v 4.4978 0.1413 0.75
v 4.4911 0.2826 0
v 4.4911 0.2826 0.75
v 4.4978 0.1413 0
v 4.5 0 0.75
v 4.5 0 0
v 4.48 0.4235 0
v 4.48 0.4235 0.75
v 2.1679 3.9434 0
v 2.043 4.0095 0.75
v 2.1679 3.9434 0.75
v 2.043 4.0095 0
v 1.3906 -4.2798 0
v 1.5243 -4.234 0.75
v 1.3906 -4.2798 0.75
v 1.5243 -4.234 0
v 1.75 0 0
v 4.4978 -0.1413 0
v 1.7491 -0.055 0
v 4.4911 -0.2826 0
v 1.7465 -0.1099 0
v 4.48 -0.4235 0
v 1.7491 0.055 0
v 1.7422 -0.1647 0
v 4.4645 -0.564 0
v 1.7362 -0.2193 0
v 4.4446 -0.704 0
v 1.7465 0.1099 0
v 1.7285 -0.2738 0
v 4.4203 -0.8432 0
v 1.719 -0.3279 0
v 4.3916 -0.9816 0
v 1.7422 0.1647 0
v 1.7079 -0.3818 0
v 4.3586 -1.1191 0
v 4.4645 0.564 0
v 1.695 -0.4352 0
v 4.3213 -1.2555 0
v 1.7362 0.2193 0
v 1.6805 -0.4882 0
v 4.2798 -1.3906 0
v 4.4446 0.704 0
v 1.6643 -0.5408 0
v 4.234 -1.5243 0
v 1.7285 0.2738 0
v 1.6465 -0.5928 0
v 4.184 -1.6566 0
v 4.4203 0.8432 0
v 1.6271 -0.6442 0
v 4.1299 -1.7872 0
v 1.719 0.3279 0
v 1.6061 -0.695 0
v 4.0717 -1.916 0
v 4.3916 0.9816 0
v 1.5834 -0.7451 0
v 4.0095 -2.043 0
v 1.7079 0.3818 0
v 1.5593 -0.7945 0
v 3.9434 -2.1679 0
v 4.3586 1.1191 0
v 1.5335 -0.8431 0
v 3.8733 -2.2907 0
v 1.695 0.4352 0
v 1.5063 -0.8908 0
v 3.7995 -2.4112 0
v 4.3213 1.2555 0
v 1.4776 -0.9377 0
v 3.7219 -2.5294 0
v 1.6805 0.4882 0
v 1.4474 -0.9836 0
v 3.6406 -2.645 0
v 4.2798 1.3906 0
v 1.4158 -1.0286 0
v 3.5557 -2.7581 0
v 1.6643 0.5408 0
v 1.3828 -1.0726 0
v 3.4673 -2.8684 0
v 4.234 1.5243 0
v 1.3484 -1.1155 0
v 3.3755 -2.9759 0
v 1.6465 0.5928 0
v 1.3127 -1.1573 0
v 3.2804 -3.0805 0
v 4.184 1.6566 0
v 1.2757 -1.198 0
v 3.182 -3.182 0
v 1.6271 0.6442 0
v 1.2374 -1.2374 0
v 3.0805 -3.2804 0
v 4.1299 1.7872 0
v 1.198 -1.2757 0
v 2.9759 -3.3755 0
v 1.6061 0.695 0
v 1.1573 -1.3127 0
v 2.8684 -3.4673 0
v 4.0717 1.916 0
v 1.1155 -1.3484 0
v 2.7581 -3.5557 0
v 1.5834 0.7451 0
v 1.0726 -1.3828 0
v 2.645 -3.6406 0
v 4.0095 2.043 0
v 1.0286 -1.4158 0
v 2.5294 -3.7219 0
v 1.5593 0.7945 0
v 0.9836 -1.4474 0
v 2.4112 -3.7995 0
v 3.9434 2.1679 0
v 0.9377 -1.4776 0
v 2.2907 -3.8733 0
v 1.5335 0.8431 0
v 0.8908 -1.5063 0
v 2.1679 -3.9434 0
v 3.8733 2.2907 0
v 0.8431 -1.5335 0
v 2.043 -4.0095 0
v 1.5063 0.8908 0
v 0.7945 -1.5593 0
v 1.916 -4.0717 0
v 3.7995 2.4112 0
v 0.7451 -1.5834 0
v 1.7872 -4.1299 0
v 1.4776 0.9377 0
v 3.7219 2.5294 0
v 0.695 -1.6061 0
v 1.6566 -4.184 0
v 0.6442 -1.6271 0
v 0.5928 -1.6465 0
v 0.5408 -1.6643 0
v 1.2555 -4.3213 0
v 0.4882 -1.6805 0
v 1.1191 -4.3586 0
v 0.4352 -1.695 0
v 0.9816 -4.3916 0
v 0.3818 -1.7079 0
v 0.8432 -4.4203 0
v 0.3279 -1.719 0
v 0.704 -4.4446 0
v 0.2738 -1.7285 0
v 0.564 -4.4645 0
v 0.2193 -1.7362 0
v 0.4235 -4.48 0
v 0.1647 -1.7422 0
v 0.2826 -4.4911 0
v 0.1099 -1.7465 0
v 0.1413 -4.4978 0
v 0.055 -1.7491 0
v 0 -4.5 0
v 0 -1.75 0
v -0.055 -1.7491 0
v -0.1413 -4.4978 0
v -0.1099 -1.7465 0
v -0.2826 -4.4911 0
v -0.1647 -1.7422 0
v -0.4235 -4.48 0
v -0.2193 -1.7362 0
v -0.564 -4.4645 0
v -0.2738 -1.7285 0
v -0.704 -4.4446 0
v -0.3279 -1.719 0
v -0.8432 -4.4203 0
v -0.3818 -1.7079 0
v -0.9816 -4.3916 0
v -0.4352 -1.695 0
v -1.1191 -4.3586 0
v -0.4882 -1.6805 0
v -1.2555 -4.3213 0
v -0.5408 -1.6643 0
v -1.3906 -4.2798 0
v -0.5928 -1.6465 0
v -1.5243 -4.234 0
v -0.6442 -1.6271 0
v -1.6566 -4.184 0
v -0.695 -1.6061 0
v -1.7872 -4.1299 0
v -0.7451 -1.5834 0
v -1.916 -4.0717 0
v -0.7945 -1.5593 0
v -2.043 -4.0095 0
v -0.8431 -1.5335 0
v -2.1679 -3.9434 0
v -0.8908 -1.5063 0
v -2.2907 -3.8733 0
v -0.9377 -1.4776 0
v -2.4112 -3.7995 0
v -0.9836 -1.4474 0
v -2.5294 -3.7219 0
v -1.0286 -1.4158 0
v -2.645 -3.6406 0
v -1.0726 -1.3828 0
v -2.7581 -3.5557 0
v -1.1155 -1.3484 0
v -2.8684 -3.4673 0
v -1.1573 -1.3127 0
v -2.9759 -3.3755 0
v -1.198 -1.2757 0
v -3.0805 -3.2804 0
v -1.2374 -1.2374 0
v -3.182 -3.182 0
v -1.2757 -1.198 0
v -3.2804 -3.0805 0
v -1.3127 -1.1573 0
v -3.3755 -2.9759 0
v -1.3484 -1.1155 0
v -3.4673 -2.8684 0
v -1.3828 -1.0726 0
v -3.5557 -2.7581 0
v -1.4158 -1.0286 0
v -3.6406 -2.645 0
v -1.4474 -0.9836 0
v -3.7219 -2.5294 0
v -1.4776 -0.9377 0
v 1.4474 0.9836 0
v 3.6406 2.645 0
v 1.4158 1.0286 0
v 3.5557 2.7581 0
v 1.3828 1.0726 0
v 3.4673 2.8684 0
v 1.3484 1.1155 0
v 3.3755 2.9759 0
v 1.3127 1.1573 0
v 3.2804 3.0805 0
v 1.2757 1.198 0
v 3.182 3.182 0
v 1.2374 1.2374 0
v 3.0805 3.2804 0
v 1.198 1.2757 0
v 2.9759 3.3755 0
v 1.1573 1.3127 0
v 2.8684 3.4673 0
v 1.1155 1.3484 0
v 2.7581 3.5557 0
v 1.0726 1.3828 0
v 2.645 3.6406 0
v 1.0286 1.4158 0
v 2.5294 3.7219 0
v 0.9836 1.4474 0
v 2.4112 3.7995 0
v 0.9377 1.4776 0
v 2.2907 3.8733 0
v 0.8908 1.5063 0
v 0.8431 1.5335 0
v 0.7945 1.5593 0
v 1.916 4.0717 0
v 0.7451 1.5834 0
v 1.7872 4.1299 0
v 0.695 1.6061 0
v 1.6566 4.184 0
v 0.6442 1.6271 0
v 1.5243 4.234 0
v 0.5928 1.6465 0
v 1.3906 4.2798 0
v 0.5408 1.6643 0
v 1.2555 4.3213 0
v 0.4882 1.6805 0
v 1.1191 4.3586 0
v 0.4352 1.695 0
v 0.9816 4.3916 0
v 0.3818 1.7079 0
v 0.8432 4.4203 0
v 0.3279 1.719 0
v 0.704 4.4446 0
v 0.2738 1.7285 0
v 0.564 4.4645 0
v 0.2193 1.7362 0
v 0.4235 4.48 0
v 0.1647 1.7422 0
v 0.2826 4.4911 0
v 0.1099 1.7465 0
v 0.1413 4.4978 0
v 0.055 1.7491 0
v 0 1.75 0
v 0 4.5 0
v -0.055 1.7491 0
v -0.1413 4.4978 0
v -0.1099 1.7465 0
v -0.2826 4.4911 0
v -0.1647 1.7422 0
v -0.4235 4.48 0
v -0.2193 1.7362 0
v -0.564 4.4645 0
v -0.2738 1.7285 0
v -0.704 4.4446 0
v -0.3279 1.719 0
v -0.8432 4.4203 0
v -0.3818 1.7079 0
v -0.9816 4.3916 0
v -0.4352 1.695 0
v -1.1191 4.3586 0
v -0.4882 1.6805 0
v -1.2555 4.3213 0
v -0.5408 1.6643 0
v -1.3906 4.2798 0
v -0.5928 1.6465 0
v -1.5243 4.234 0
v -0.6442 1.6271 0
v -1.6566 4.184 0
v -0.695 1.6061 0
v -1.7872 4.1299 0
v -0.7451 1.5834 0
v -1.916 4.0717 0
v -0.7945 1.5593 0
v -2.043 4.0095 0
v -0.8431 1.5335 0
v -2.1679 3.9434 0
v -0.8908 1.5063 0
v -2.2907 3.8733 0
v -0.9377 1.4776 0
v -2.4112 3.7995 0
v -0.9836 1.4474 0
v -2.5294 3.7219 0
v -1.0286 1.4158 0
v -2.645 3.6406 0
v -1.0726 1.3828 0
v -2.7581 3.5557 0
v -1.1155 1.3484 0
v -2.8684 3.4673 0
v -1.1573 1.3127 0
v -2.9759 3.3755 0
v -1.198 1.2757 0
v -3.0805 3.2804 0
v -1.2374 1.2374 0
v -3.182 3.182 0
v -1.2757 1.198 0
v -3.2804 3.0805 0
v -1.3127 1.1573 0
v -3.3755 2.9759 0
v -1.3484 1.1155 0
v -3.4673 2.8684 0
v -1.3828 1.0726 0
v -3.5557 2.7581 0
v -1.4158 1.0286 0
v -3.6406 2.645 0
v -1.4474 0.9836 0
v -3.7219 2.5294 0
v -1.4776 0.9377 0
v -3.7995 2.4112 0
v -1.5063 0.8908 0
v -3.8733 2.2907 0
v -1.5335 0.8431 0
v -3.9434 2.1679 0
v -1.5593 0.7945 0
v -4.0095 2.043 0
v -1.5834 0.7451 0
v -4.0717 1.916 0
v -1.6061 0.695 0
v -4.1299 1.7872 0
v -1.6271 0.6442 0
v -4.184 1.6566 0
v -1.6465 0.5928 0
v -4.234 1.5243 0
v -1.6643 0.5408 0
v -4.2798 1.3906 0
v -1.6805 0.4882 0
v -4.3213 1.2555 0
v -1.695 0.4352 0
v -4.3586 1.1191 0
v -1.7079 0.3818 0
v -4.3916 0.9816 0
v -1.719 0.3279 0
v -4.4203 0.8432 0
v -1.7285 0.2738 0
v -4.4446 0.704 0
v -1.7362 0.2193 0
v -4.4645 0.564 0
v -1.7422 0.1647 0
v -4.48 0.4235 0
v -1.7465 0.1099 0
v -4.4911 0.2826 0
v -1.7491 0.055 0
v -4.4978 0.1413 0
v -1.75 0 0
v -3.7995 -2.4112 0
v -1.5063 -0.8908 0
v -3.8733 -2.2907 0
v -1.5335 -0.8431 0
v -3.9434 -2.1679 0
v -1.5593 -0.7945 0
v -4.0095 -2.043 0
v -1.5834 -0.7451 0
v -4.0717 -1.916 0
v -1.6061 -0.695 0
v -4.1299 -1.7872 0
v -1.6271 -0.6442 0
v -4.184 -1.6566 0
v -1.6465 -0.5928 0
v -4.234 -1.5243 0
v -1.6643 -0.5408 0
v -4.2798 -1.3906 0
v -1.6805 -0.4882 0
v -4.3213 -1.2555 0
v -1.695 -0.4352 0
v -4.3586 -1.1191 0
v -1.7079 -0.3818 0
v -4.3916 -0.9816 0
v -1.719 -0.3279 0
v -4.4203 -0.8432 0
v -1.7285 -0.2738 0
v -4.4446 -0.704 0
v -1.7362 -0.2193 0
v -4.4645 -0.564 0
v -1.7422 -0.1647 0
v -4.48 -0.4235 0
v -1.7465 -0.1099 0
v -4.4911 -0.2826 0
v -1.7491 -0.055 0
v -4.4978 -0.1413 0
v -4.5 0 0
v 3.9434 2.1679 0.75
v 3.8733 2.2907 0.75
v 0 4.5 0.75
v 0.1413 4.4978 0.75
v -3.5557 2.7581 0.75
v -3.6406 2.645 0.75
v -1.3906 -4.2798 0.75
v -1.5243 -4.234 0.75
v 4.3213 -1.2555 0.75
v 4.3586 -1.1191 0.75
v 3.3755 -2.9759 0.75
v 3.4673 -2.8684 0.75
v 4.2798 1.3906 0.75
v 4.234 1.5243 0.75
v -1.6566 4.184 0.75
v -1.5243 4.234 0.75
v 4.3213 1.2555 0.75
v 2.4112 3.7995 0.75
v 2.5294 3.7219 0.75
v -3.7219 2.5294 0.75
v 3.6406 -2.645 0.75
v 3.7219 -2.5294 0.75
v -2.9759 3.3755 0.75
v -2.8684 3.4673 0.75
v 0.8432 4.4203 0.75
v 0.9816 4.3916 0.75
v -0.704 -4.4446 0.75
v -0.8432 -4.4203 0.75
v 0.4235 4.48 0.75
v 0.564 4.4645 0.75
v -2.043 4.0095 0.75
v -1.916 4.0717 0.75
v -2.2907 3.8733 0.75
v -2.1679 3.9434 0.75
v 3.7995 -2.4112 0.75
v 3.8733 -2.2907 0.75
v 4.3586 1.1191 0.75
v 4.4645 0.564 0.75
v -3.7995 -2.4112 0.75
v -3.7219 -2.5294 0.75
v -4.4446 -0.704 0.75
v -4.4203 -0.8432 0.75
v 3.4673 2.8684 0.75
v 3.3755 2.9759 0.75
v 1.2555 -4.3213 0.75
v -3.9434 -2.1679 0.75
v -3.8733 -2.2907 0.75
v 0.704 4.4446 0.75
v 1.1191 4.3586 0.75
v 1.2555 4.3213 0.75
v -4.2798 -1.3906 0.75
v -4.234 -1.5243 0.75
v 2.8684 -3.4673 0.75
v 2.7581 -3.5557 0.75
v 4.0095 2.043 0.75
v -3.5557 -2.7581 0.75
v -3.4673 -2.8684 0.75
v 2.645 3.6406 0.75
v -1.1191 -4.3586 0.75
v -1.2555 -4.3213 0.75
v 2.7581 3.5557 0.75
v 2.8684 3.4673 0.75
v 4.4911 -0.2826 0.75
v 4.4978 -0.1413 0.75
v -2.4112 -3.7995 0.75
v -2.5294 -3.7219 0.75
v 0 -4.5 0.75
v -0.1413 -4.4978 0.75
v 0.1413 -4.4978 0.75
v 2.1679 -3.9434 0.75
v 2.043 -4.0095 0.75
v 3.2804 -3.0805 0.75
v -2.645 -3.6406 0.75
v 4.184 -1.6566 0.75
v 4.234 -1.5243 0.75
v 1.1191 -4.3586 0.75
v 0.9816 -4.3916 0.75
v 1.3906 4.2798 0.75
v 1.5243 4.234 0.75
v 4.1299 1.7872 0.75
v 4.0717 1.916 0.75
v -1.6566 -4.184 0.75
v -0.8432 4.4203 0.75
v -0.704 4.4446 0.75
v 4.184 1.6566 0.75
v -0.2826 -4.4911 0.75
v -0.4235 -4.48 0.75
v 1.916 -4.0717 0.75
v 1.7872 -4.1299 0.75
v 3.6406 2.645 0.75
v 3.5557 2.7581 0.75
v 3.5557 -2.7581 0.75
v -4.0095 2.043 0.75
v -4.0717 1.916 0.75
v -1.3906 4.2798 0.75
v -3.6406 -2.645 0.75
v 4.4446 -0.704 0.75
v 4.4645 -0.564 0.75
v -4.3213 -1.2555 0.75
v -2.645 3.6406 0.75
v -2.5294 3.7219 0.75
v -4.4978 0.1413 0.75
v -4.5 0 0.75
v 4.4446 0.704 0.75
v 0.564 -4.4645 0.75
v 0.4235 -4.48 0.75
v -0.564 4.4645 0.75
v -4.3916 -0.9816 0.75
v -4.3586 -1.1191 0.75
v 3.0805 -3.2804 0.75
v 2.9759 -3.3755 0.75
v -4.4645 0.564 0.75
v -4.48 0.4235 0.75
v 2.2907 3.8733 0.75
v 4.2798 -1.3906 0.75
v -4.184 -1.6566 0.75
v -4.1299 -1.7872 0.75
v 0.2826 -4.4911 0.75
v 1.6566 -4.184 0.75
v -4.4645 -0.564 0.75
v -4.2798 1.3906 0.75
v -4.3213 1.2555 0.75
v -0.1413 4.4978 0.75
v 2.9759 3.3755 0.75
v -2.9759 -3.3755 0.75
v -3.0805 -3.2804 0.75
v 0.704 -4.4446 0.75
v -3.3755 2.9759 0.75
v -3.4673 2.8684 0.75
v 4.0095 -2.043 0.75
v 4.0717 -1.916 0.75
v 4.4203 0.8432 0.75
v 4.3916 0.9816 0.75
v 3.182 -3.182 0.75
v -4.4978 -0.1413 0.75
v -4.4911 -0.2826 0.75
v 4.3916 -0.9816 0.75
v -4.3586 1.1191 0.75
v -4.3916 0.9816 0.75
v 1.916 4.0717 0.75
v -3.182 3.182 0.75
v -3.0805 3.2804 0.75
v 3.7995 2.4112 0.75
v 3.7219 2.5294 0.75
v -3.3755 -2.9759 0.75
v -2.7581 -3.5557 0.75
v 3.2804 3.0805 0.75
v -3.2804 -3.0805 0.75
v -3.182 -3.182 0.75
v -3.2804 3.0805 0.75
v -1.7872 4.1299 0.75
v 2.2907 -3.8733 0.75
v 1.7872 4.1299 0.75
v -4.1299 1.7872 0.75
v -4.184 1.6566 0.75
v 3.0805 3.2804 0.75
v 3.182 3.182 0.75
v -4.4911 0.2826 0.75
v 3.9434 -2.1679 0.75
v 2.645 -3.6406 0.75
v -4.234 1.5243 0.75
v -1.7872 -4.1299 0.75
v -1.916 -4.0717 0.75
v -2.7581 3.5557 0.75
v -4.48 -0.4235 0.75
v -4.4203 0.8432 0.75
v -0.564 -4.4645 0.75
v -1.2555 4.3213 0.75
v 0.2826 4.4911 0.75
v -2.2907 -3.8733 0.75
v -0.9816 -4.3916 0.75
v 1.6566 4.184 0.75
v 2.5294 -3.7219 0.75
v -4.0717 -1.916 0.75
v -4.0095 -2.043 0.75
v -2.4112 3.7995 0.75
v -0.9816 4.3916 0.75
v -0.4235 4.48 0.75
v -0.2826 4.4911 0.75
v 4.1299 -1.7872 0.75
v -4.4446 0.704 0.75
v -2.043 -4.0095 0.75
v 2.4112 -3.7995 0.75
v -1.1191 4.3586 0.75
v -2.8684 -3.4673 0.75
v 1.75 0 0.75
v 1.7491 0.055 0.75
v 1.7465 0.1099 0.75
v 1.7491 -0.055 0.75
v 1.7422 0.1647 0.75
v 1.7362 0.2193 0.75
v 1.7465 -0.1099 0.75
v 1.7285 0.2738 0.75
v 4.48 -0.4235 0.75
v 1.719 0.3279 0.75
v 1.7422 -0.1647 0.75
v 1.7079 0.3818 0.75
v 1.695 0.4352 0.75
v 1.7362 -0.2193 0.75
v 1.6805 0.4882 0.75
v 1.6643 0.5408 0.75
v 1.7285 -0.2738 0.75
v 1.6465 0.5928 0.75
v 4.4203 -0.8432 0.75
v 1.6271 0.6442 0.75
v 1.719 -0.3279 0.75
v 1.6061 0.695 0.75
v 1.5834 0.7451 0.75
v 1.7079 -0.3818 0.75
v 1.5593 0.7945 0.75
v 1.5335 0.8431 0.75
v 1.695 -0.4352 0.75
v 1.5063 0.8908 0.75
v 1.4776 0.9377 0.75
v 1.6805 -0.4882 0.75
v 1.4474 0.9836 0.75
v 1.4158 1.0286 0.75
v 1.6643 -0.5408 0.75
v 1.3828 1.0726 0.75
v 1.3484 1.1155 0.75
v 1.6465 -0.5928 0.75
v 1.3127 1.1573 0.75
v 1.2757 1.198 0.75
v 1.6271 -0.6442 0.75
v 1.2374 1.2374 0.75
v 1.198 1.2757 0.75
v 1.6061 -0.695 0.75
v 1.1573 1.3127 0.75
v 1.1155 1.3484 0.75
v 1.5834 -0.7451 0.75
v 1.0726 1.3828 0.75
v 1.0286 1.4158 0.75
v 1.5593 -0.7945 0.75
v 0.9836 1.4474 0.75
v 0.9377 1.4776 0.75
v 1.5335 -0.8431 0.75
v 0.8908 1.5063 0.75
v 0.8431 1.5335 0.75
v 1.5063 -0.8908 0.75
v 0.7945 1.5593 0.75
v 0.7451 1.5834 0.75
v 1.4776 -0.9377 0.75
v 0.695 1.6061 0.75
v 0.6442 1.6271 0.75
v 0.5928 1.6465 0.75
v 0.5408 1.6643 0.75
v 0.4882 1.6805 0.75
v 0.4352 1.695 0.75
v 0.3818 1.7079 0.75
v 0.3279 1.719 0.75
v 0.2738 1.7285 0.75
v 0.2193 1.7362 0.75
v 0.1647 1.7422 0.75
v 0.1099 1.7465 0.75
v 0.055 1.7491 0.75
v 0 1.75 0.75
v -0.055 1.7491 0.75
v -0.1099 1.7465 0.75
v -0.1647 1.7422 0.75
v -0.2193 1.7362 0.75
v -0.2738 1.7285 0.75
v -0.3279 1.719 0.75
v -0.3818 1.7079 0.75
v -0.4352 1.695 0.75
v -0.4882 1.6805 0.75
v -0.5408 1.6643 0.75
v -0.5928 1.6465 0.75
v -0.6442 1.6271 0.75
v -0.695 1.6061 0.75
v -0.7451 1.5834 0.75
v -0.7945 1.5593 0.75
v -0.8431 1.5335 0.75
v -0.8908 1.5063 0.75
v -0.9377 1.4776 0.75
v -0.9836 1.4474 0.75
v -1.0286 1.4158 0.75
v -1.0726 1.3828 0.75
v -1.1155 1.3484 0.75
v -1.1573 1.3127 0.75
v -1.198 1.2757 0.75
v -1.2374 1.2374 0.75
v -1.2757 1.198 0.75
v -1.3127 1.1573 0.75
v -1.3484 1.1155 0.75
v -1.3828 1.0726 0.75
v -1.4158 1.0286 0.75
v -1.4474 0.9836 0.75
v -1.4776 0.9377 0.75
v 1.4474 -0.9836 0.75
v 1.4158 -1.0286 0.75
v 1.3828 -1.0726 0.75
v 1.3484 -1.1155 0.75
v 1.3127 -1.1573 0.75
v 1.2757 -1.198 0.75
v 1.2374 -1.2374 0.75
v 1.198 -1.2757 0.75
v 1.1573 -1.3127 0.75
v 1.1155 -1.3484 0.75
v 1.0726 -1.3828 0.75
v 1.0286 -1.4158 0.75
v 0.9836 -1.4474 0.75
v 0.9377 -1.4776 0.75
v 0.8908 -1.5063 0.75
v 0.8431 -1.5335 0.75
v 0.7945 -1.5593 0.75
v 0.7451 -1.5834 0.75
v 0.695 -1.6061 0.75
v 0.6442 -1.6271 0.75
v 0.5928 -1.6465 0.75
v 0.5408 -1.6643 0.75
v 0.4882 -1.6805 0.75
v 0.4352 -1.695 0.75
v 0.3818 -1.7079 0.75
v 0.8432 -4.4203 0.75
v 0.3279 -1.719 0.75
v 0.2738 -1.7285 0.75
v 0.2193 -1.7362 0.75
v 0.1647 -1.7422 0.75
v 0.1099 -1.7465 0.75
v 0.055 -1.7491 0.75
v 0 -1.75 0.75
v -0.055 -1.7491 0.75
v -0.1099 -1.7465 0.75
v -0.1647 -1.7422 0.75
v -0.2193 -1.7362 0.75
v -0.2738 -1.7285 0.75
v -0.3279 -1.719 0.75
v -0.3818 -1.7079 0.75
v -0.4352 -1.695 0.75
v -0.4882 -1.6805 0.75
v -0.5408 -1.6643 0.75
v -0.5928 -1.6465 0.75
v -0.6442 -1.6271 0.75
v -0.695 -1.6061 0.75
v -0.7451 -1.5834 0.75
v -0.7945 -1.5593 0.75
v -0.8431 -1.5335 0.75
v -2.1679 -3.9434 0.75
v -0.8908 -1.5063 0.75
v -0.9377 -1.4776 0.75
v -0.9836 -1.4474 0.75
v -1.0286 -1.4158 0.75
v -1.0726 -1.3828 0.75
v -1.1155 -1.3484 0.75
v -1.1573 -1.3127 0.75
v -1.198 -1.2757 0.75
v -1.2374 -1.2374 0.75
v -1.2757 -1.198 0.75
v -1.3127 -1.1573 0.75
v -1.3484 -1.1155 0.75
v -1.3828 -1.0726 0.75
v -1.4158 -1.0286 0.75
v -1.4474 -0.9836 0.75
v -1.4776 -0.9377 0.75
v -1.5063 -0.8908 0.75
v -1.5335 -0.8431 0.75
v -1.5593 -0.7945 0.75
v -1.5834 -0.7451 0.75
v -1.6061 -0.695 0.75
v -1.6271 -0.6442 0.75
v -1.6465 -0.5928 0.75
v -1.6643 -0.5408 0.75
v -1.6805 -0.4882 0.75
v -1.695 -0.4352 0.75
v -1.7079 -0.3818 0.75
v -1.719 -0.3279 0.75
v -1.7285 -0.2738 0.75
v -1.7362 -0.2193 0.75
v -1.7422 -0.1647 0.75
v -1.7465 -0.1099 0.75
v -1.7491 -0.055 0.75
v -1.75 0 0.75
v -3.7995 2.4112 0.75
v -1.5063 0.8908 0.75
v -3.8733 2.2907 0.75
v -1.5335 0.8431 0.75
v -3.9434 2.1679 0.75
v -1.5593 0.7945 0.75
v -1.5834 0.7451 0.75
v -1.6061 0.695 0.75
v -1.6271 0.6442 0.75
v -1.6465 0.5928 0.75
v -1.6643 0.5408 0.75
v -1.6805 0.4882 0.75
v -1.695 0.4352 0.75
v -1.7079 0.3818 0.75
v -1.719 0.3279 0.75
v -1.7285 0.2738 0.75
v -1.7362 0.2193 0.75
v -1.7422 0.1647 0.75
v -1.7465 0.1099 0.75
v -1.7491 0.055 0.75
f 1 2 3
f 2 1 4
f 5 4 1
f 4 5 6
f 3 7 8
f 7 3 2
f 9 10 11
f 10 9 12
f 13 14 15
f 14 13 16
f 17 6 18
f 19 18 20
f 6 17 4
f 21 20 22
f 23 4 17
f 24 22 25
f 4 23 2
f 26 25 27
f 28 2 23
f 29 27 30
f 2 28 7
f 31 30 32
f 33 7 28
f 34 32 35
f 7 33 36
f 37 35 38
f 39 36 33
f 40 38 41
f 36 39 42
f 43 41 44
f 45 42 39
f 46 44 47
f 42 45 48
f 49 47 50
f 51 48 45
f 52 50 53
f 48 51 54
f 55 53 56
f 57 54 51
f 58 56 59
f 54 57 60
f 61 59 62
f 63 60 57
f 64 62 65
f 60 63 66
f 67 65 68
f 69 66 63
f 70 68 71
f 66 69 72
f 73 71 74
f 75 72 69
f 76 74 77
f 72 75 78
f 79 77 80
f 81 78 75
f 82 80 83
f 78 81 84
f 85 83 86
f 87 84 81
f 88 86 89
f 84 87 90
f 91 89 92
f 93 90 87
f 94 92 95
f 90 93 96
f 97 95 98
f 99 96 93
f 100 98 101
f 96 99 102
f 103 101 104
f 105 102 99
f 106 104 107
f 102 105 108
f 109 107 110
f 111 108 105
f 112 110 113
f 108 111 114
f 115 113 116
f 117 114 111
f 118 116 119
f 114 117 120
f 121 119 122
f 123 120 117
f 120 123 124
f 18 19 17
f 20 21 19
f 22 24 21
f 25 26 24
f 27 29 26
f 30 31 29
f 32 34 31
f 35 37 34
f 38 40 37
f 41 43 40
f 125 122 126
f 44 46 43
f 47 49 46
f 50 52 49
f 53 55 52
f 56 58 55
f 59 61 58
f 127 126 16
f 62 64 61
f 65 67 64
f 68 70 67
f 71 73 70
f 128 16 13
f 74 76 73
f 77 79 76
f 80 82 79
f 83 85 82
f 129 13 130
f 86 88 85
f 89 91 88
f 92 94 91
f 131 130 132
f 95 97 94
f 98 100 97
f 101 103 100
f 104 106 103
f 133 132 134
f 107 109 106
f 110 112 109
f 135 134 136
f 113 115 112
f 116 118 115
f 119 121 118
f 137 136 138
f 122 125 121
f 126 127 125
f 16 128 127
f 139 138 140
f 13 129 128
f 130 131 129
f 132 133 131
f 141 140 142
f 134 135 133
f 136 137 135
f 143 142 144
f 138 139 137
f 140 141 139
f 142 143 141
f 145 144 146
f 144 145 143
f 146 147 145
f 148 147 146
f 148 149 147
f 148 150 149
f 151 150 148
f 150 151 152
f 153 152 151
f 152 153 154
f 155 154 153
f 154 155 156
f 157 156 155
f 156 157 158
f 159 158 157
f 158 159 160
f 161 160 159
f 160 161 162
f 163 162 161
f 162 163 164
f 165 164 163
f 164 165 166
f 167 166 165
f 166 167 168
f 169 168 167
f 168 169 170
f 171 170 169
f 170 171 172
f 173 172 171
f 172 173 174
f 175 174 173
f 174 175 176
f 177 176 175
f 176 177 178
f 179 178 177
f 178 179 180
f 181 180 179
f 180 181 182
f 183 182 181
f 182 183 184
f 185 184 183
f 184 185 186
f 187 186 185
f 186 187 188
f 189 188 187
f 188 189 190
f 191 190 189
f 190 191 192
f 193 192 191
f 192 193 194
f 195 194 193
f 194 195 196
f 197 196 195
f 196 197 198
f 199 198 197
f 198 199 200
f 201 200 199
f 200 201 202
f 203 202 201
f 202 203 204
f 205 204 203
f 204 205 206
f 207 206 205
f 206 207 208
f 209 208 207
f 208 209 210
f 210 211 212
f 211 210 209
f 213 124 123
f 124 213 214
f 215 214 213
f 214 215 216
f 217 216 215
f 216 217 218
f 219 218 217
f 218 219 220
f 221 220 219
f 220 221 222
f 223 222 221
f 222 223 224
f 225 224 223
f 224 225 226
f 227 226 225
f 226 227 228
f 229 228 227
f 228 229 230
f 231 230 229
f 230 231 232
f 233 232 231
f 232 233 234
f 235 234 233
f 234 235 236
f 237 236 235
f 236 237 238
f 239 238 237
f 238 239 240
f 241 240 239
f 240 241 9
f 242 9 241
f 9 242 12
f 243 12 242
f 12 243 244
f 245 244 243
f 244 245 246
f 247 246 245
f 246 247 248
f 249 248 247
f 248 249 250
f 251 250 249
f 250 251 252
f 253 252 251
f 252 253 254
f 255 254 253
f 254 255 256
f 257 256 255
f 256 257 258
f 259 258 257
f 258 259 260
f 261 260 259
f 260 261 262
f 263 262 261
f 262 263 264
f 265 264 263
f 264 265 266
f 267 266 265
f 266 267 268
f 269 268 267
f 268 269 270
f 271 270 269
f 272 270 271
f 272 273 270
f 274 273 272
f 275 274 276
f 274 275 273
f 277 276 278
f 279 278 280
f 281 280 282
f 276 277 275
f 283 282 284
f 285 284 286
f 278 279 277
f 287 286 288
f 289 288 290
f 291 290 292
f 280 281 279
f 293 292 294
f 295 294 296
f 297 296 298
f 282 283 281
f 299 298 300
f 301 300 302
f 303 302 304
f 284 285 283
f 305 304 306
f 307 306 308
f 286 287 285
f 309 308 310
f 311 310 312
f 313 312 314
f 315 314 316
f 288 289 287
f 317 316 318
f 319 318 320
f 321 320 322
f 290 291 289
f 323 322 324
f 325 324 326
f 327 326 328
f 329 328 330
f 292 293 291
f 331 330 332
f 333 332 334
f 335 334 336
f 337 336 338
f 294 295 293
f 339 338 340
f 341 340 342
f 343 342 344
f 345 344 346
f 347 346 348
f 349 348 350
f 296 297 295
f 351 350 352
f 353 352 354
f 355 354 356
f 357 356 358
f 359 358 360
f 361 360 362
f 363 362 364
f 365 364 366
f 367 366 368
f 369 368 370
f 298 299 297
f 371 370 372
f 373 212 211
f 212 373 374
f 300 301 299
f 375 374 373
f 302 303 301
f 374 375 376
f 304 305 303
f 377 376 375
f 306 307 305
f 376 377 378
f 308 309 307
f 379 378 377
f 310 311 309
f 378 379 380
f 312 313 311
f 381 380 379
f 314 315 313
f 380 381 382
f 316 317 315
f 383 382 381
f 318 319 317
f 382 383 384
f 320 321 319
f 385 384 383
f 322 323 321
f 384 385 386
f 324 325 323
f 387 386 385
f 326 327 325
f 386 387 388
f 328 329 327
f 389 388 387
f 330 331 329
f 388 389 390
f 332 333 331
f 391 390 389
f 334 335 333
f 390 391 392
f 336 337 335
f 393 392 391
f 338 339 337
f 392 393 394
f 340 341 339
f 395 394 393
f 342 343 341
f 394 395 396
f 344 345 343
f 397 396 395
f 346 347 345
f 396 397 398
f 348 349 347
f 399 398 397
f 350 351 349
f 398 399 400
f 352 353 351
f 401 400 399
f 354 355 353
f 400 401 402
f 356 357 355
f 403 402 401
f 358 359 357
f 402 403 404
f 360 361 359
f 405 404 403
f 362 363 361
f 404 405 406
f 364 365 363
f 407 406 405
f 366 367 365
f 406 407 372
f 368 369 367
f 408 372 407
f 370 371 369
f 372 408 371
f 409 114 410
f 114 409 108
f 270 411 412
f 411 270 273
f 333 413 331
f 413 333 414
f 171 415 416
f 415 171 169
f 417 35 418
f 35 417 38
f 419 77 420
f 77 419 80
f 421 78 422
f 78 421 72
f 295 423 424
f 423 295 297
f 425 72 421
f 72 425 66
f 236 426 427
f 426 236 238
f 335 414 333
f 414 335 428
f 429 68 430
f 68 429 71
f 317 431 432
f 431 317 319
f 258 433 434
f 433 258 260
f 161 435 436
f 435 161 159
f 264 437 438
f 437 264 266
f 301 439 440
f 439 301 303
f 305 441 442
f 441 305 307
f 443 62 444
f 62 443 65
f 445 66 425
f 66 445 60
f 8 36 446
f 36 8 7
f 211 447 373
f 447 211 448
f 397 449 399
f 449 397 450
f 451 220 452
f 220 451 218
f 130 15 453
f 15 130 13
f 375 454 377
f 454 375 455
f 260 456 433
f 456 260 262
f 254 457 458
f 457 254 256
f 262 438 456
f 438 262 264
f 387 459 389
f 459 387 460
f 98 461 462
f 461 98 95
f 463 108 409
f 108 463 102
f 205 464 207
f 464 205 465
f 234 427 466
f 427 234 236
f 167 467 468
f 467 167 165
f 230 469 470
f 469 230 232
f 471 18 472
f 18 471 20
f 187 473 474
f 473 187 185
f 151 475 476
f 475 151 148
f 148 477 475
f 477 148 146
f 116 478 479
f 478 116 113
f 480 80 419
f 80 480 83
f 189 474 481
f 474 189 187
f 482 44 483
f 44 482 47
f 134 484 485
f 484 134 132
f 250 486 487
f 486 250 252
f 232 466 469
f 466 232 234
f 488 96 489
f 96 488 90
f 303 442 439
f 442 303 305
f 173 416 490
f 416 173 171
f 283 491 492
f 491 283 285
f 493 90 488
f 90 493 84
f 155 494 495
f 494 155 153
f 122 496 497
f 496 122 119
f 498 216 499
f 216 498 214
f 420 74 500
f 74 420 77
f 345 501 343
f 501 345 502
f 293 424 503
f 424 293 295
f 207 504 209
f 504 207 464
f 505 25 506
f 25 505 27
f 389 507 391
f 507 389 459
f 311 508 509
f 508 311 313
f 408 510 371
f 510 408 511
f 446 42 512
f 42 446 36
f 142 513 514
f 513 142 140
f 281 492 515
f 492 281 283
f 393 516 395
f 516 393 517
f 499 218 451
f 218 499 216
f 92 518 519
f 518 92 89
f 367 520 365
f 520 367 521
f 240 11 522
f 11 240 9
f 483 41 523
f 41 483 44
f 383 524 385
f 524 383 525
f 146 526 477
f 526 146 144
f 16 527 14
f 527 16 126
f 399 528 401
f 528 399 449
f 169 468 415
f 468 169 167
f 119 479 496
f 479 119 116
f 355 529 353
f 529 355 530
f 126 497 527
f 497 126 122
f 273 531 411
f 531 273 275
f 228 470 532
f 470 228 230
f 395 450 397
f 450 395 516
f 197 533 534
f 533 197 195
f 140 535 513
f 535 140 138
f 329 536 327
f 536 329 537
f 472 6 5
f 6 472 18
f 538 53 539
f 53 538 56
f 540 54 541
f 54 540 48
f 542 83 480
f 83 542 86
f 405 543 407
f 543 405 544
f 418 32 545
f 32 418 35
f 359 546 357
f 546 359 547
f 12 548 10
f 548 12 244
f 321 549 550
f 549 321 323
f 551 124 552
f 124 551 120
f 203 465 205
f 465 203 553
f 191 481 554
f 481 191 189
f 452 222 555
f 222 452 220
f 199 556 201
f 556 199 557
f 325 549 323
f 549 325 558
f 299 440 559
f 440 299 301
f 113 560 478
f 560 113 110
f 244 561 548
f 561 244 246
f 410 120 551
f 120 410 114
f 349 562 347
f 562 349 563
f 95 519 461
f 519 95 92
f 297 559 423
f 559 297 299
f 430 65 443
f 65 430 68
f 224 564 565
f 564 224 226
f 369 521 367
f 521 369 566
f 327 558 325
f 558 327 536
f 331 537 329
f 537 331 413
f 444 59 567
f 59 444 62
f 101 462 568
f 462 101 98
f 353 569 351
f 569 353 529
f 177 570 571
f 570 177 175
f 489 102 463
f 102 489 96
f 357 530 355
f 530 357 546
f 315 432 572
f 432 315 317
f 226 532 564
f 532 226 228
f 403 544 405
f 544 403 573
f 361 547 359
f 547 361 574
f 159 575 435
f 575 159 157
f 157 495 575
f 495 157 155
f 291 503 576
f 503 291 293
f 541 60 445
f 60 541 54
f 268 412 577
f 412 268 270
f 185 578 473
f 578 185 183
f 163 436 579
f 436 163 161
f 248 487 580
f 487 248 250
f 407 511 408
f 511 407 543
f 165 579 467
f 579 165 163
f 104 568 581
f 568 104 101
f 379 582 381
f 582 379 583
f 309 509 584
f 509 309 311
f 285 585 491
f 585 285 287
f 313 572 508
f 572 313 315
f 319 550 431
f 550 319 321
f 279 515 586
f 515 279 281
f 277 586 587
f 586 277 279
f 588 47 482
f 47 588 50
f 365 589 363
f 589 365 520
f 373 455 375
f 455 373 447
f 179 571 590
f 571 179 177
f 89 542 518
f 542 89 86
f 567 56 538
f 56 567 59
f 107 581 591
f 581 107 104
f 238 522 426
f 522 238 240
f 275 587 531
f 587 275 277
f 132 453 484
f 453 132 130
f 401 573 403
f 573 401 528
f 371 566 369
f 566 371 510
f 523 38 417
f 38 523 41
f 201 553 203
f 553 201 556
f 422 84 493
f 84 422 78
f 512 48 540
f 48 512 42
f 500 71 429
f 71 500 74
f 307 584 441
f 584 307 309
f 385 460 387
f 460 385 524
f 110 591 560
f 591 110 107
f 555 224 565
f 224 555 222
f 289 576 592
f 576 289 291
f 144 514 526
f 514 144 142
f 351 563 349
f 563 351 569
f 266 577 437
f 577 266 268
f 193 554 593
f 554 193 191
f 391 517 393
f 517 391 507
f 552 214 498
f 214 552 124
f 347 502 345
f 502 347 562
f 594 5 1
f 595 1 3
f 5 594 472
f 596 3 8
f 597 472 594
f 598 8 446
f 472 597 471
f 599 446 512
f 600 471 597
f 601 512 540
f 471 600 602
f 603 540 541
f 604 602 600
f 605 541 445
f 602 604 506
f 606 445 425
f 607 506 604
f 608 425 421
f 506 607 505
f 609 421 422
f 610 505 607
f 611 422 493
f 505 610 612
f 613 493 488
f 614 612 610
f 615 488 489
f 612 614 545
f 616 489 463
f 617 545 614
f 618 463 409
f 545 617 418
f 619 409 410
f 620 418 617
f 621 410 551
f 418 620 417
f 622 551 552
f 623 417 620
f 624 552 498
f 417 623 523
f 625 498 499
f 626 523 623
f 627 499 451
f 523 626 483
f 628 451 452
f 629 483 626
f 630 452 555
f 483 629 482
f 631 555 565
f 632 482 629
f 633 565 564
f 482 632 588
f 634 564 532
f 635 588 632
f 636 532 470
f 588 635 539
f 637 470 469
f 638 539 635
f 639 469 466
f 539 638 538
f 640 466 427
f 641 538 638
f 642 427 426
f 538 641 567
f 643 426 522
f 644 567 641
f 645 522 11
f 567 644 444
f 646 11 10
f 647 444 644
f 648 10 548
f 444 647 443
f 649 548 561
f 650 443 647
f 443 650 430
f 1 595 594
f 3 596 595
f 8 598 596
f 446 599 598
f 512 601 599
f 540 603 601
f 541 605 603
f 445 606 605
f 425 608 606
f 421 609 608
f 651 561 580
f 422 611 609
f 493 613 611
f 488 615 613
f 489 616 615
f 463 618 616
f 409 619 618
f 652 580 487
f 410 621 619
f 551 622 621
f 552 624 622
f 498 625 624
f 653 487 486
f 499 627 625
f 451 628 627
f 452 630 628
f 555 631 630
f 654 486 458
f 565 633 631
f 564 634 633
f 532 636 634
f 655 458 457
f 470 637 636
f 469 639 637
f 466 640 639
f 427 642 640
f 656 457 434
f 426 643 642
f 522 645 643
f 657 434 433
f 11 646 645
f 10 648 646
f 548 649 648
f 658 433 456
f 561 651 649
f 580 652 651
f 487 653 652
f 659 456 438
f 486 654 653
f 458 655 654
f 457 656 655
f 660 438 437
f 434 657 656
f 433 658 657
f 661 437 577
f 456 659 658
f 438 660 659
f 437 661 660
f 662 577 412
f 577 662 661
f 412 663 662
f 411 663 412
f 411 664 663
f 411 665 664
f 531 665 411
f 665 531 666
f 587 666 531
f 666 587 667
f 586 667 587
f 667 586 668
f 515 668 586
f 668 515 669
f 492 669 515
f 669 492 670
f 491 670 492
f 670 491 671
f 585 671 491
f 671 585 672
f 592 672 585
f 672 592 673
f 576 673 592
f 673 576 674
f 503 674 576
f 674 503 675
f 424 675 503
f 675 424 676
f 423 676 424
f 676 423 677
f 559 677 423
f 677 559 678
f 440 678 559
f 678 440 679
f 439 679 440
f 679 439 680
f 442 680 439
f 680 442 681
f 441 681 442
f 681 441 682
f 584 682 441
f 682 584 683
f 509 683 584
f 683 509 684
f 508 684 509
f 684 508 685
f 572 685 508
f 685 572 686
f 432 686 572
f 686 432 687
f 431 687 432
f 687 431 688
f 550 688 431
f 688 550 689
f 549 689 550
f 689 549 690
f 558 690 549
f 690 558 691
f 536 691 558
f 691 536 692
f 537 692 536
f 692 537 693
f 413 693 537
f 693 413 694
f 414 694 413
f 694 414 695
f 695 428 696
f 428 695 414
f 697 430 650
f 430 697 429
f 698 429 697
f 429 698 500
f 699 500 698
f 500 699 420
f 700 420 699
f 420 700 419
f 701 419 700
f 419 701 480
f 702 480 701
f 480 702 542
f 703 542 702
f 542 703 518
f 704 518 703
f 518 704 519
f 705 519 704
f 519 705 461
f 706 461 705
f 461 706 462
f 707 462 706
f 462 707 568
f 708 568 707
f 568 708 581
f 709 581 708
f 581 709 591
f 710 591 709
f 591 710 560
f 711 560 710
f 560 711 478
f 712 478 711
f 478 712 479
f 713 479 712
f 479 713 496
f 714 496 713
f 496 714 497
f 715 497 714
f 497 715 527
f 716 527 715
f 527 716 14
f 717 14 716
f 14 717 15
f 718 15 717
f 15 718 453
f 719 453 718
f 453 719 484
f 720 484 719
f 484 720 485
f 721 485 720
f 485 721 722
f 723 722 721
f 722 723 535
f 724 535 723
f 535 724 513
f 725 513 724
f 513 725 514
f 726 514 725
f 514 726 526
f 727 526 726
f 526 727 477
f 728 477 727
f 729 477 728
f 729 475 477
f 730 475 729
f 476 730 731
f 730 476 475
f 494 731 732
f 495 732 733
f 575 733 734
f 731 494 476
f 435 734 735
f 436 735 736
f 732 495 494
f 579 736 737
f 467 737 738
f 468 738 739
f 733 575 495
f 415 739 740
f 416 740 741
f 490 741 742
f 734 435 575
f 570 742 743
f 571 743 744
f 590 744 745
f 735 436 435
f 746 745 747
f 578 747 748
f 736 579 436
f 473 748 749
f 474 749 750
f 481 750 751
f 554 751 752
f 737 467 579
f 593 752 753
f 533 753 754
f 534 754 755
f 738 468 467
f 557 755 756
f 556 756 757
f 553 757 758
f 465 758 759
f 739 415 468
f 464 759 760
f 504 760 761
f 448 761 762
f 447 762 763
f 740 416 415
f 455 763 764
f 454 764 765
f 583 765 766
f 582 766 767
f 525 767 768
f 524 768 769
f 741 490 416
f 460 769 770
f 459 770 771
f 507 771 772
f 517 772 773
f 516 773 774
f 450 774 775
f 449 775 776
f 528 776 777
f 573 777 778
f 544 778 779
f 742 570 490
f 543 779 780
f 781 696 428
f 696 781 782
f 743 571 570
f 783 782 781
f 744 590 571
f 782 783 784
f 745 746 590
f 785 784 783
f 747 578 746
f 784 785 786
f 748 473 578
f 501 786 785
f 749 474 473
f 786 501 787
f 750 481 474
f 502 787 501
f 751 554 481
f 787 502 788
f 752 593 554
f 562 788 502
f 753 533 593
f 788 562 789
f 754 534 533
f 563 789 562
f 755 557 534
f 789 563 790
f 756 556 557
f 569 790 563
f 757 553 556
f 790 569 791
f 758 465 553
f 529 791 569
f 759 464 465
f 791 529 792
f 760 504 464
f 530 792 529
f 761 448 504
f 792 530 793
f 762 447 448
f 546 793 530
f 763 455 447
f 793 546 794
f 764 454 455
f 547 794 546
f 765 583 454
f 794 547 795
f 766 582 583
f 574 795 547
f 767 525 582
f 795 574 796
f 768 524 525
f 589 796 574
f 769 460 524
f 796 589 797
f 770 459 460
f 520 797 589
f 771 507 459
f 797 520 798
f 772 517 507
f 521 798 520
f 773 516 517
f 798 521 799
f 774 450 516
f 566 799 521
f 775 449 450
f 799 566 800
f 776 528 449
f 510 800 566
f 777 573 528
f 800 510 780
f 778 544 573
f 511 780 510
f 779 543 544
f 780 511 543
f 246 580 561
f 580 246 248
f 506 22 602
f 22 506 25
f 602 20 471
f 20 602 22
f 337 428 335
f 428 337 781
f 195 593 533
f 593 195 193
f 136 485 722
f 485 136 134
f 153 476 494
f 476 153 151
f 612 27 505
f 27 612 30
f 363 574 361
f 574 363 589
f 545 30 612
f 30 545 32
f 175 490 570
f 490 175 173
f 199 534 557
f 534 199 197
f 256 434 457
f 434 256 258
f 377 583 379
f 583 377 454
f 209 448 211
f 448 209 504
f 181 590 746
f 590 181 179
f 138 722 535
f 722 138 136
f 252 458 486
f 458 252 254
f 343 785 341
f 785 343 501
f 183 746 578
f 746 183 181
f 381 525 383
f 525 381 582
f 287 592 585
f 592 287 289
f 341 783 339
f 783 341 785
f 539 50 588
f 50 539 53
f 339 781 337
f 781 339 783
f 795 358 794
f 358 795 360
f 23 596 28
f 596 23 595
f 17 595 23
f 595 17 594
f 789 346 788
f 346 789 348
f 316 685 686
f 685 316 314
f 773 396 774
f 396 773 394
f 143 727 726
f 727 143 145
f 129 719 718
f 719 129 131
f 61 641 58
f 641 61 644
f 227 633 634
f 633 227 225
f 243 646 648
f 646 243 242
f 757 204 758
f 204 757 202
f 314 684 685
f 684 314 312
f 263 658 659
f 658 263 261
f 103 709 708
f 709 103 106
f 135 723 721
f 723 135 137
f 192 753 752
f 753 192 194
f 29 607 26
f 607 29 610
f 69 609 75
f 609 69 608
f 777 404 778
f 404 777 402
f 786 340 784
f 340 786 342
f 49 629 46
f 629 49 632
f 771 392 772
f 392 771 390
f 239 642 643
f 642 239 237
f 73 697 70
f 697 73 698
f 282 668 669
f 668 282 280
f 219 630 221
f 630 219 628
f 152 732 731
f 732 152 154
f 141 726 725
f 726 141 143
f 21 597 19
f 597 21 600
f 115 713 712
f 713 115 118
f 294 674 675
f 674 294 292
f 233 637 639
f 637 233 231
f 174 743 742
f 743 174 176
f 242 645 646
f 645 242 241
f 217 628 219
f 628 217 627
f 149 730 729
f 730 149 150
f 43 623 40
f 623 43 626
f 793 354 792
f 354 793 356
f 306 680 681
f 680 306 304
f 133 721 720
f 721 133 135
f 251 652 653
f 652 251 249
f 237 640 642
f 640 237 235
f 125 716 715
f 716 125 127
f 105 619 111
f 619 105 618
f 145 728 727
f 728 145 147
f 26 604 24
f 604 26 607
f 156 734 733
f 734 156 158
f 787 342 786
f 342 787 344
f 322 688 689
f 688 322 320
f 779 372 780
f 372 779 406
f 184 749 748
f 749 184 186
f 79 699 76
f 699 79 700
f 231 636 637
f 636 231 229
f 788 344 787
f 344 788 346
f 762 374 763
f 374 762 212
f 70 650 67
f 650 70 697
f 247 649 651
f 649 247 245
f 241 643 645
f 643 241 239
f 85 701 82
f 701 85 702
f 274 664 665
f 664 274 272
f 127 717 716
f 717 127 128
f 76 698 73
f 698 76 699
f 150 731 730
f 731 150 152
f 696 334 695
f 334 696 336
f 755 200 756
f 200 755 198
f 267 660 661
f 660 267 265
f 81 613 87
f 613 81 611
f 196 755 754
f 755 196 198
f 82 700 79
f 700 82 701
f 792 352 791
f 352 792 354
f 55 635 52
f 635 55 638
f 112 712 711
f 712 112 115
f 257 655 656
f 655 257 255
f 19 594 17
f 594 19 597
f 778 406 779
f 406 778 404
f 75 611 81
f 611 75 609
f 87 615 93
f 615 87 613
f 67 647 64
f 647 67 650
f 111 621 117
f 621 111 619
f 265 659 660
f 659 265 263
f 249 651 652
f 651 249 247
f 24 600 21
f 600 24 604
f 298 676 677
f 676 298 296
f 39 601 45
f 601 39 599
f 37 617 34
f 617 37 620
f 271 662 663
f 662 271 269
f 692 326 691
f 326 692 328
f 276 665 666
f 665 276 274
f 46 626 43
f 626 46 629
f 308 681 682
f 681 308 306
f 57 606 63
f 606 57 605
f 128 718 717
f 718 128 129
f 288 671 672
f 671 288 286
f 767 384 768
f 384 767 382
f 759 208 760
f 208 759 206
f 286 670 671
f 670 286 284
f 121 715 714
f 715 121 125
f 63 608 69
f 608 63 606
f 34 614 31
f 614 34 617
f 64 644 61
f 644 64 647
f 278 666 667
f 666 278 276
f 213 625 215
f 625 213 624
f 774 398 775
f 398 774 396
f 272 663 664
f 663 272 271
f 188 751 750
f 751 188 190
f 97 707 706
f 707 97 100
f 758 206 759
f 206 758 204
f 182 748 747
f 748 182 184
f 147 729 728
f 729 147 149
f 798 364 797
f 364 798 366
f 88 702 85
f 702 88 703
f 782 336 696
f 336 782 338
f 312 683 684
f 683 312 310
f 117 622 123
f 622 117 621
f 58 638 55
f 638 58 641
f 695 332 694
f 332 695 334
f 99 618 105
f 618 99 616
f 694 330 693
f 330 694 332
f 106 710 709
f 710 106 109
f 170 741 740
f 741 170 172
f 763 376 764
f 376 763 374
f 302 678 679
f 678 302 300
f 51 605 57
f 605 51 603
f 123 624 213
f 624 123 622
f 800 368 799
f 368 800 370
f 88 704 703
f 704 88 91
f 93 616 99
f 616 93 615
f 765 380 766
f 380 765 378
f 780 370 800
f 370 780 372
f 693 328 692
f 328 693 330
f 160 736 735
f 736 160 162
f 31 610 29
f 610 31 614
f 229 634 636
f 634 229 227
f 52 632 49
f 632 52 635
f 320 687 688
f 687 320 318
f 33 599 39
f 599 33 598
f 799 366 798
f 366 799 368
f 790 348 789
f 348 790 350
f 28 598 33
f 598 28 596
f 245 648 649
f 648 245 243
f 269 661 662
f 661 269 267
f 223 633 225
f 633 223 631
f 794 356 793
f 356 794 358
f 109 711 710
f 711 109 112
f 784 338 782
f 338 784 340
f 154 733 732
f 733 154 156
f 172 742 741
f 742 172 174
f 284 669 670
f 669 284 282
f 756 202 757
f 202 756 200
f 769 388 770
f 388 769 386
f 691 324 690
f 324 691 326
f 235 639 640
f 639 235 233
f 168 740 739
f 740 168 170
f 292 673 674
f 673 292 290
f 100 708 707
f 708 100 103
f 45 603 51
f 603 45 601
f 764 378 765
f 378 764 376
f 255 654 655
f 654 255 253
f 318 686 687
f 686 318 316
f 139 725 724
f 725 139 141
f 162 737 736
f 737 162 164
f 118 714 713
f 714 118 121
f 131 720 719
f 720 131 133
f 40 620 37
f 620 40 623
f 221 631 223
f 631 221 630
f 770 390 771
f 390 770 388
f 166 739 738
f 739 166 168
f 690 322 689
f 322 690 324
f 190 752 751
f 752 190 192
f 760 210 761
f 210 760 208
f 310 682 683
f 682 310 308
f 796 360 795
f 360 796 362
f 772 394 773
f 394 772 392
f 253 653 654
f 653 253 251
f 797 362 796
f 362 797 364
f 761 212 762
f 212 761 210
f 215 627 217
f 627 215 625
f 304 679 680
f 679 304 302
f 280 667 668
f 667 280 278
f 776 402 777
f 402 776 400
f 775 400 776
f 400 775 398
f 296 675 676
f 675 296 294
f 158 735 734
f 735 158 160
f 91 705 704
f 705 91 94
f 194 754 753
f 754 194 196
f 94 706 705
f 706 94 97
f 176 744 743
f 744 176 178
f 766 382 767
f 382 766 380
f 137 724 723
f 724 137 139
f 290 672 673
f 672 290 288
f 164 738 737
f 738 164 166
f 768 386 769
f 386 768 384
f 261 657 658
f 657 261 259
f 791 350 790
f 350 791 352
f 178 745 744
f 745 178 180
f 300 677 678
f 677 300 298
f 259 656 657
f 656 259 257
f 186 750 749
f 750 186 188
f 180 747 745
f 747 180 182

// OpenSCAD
$fn=200;

s=9;
is=3.5;
t=.75;

difference(){
    cylinder(d=s, h=t);
    
    translate([0,0,-.1])
    cylinder(d=is, h=t*2);
}    
